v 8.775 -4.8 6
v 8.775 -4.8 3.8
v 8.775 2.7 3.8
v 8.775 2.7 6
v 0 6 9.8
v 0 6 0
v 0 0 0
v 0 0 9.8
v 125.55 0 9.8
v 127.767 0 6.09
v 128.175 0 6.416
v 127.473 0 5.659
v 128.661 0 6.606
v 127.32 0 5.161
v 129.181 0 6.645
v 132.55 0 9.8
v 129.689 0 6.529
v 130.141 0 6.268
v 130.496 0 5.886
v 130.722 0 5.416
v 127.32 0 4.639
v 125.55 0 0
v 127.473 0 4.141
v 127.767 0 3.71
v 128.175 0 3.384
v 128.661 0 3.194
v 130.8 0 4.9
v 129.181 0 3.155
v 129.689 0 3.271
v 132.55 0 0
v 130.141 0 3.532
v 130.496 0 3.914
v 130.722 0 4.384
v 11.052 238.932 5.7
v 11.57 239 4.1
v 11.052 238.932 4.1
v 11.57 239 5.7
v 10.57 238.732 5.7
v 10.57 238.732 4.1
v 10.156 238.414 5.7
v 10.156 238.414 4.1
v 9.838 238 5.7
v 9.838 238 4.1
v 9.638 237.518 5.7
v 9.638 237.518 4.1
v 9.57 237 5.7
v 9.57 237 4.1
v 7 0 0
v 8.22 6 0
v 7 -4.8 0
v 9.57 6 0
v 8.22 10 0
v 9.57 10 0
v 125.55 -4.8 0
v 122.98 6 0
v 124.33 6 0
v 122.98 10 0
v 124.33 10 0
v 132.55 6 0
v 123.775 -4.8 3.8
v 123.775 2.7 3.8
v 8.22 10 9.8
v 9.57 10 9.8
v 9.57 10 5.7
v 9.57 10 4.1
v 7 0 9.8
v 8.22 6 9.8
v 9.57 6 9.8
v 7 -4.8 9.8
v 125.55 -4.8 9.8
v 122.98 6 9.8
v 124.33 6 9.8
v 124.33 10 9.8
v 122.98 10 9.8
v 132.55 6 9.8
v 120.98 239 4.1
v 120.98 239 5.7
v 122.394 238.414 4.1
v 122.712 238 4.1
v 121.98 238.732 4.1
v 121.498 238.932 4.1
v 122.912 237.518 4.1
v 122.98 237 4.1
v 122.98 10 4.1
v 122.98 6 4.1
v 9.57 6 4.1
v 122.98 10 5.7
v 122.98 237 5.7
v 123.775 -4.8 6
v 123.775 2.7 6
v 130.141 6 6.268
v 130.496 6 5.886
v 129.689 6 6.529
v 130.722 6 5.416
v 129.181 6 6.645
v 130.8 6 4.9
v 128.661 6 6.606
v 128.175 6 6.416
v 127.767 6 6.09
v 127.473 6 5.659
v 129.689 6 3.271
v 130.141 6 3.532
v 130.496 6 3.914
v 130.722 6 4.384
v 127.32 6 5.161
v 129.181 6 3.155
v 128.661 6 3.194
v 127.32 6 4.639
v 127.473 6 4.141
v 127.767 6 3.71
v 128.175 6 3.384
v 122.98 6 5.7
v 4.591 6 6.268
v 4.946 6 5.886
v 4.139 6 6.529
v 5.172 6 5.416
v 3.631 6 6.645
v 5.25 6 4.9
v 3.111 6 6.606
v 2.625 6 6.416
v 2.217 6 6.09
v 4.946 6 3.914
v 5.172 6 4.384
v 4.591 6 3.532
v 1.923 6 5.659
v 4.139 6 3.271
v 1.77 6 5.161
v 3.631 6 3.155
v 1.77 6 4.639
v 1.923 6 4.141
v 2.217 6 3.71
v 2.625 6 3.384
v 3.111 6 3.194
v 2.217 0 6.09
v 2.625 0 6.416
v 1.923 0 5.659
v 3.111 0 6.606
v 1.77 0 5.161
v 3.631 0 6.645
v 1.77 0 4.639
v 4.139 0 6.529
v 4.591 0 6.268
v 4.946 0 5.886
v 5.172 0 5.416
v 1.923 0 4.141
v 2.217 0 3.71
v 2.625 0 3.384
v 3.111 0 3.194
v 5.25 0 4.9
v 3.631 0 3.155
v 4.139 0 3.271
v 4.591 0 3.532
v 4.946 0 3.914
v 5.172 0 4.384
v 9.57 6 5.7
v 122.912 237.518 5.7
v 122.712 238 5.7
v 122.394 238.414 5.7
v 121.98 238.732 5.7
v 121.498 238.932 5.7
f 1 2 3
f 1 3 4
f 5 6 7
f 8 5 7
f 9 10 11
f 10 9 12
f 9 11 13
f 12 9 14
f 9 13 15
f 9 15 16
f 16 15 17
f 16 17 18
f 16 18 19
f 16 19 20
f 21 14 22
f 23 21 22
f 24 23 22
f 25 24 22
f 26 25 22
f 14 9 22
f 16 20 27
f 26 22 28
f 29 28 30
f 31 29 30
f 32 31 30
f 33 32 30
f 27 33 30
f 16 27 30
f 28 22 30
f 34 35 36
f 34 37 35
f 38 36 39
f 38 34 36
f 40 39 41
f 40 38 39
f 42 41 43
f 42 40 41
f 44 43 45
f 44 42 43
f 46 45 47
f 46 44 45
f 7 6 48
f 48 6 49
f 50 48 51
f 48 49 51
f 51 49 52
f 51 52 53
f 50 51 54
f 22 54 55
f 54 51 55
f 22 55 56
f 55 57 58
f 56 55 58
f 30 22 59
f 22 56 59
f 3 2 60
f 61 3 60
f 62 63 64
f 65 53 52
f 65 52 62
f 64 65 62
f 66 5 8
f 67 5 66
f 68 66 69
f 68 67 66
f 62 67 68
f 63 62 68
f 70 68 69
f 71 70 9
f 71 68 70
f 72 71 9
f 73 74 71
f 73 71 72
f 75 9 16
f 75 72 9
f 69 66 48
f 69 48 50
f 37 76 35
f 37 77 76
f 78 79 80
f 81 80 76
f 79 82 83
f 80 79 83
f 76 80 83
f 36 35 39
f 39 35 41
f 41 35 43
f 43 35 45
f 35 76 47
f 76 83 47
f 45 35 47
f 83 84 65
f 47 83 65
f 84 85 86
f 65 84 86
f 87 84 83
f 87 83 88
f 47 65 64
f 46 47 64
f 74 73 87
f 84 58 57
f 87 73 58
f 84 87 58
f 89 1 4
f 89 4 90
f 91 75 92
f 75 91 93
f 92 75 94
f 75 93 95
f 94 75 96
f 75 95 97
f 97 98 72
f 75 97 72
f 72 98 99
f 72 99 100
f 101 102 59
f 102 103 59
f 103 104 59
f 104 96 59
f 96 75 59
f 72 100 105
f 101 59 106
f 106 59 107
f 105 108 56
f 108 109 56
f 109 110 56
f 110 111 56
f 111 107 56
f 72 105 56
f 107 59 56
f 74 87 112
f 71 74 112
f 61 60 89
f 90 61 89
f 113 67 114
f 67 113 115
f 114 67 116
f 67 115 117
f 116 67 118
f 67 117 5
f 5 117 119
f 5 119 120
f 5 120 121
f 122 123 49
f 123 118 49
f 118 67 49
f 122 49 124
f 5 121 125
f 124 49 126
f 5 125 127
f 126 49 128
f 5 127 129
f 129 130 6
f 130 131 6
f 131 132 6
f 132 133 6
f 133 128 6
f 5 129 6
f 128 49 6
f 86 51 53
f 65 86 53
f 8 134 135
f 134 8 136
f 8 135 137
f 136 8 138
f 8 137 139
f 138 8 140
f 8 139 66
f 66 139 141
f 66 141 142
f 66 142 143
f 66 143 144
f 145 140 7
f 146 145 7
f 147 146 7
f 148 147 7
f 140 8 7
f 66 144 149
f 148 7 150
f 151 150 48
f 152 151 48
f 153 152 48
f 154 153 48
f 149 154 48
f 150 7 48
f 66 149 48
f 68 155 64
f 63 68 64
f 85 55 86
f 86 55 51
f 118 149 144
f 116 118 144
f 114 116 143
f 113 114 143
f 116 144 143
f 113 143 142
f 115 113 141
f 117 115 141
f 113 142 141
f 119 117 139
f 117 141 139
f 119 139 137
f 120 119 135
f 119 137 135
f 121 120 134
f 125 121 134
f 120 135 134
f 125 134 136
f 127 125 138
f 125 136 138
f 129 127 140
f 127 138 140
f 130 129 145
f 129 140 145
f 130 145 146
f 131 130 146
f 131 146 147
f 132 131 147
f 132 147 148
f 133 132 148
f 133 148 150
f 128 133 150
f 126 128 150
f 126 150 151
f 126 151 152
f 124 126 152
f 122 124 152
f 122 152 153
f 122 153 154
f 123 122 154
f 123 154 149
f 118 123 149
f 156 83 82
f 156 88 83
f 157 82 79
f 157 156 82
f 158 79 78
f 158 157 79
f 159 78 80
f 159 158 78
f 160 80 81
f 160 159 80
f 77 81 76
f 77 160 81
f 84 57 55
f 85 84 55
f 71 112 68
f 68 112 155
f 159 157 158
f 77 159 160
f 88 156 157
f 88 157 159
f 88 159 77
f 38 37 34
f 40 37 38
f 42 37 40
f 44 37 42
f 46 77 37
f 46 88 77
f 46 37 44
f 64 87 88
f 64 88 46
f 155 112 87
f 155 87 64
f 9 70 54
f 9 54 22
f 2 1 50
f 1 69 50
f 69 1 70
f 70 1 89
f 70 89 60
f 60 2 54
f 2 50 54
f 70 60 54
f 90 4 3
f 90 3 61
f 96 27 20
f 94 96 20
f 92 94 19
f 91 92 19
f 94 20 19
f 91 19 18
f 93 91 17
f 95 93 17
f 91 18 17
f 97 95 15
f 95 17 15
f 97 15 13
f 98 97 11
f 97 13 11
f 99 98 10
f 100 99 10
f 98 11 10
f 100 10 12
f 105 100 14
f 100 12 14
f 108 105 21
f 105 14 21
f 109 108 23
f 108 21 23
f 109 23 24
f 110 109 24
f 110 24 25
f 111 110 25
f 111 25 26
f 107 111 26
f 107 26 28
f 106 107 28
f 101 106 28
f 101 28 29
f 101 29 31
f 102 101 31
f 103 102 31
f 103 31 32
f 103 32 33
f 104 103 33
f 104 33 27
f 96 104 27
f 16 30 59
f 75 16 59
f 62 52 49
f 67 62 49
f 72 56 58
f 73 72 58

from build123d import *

# Parameters (mm, degrees)
F1_DEPTH = 9.8
F2_R     = 1.75
F3_DEPTH = 7
F4_R     = 1.75
F5_DEPTH = 7
F6_W     = 115
F6_H     = 2.2
F7_DEPTH = 7.5
F8_W     = 113.41
F8_H     = 1.6
F9_DEPTH = 233
F10_R    = 2


with BuildPart() as f1:
    # F0 (on Top) → F1 (new body)
    with BuildSketch(Plane.XY):
        Polygon((8.22, 6), (0, 6), (0, 0), (7, 0), (7, -4.8), (125.55, -4.8), (125.55, 0), (132.55, 0), (132.55, 6), (124.33, 6), (124.33, 10), (122.98, 10), (122.98, 6), (9.57, 6), (9.57, 10), (8.22, 10), align=None)
    extrude(amount=F1_DEPTH)

    # F2 (on face) → F3 (cut)
    with BuildSketch(Plane.XZ):
        with Locations((3.5, 4.9)):
            Circle(F2_R)
    extrude(amount=-F3_DEPTH, mode=Mode.SUBTRACT)

    # F4 (on face) → F5 (cut)
    with BuildSketch(Plane.XZ):
        with Locations((129.05, 4.9)):
            Circle(F4_R)
    extrude(amount=-F5_DEPTH, mode=Mode.SUBTRACT)

    # F6 (on face) → F7 (cut)
    with BuildSketch(Plane.XZ.offset(4.8)):
        with Locations((66.275, 4.9)):
            Rectangle(F6_W, F6_H)
    extrude(amount=-F7_DEPTH, mode=Mode.SUBTRACT)

    # F8 (on face) → F9 (join)
    with BuildSketch(Plane(origin=(0, 6, 0), x_dir=(-1, 0, 0), z_dir=(0, 1, 0))):
        with Locations((-66.275, 4.9)):
            Rectangle(F8_W, F8_H)
    extrude(amount=F9_DEPTH)

    # F10
    f10_edges = [f1.edges().sort_by_distance(p)[0] for p in [
        (122.98, 239, 4.9),
        (9.57, 239, 4.9),
    ]]
    fillet(f10_edges, radius=F10_R)


solid = f1.part
